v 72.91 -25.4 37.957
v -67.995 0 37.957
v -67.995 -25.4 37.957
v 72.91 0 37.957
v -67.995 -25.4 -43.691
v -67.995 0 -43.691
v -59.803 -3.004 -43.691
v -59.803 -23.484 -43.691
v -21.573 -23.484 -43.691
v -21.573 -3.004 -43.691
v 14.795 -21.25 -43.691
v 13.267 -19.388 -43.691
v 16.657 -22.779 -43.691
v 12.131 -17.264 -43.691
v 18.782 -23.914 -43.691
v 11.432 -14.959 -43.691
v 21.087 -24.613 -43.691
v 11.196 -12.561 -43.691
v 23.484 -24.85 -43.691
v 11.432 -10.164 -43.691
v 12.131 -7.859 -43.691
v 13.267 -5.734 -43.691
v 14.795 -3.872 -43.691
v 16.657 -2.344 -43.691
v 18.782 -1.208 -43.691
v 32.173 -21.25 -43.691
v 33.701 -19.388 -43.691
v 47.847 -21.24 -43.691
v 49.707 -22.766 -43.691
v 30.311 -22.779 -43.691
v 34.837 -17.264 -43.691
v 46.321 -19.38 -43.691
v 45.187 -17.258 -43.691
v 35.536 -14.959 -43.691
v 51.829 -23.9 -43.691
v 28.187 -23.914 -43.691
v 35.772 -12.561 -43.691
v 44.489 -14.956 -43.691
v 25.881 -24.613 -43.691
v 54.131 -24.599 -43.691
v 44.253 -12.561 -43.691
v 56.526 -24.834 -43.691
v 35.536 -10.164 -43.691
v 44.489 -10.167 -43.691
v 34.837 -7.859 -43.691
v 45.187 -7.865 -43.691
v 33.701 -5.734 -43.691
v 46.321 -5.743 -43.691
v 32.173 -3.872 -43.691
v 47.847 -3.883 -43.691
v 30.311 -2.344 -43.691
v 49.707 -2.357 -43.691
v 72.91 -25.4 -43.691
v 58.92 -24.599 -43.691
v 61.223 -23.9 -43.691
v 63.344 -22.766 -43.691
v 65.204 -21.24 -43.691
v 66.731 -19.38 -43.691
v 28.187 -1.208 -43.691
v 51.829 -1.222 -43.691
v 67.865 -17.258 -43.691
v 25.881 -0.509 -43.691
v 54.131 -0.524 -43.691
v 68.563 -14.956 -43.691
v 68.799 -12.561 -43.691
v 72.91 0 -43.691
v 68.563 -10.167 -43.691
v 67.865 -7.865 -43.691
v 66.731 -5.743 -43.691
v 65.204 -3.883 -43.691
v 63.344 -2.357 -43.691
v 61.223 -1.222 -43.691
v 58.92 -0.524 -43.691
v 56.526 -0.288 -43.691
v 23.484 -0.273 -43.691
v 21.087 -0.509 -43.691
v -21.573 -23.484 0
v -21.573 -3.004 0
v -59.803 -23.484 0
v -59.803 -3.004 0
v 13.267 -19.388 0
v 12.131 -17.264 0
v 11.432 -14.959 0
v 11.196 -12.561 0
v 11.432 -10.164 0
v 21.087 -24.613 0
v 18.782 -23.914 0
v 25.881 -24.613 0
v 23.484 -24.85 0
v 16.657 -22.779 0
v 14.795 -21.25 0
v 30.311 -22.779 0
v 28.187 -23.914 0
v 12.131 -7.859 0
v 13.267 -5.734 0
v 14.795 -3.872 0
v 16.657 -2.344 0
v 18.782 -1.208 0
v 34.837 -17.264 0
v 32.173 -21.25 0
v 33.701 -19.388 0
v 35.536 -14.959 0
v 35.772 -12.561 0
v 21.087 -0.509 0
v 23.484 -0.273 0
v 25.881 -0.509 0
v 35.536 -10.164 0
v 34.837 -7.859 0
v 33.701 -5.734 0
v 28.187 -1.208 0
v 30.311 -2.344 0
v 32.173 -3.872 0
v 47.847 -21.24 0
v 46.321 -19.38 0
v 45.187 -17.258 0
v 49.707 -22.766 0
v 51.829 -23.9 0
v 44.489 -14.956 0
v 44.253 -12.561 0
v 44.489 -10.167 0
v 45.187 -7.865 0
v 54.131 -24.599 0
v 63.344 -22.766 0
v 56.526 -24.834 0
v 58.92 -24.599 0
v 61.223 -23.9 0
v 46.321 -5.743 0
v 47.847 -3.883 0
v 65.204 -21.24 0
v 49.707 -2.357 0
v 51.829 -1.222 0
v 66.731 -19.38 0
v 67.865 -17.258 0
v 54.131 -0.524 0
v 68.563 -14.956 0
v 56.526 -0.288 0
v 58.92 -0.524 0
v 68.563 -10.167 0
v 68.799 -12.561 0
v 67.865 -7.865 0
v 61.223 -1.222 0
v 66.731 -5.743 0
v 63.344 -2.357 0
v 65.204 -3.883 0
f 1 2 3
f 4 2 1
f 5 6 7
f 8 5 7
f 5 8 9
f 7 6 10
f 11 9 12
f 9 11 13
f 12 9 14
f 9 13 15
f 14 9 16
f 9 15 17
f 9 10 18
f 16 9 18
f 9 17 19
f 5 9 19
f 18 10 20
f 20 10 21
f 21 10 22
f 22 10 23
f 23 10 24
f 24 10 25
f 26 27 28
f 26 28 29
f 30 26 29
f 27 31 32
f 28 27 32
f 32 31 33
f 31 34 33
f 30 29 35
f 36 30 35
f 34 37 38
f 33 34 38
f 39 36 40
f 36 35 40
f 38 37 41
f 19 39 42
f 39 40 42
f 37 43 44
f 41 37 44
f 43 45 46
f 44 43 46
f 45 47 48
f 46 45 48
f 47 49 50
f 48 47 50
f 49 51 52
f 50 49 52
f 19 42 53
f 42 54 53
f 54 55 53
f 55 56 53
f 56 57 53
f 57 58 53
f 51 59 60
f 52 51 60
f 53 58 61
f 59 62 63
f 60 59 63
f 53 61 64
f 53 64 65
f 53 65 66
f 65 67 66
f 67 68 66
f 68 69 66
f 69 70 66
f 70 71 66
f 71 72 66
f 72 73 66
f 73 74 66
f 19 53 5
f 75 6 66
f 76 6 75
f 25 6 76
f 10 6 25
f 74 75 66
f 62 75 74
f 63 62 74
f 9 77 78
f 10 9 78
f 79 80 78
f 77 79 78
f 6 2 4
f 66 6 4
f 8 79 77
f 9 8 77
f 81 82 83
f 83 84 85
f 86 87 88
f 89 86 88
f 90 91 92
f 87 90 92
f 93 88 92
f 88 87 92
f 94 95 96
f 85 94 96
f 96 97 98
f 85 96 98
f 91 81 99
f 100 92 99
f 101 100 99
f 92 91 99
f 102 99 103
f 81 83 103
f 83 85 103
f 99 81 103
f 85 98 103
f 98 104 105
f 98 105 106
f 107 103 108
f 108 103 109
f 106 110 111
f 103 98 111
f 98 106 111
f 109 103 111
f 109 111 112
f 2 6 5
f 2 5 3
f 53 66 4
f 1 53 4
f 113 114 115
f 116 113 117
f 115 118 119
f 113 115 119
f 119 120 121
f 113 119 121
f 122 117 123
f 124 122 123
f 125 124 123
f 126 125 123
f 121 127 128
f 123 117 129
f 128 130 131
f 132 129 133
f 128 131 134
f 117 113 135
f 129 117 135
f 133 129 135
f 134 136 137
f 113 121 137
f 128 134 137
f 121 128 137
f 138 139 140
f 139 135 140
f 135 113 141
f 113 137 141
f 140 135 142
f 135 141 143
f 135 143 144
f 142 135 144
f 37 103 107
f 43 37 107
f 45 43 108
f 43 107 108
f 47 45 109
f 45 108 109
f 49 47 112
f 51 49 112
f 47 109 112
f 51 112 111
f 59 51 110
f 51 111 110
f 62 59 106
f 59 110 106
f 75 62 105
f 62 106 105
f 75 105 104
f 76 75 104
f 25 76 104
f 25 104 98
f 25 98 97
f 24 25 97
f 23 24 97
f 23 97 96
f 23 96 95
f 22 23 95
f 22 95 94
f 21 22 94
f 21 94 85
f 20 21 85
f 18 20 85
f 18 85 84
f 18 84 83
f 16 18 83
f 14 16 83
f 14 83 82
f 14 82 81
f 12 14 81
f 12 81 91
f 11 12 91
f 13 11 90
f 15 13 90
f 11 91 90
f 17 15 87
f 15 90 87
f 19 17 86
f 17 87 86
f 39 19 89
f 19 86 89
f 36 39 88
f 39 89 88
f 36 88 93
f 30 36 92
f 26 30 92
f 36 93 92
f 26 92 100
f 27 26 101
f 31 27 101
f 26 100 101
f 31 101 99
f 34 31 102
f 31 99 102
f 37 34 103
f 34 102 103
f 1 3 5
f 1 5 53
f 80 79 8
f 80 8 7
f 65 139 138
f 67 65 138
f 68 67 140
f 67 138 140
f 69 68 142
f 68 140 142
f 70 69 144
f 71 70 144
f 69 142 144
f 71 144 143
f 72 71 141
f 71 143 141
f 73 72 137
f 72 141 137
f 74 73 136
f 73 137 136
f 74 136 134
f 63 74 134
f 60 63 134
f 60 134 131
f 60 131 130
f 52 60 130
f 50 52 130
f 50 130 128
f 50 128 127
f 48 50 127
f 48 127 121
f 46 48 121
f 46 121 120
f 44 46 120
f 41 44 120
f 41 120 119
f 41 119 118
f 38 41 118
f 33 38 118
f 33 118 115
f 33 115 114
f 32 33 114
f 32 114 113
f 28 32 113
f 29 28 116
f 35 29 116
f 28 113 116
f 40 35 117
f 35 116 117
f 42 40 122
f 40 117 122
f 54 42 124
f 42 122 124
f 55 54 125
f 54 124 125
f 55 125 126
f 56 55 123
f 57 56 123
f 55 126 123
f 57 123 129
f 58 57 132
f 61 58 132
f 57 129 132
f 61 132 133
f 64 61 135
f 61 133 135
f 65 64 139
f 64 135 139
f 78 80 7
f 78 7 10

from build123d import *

# Parameters (mm, degrees)
F0_W     = 140.904985
F0_H     = 81.648435
F1_DEPTH = 25.4
F2_R     = 12.273047
F2_R_2   = 12.288223
F2_W     = 38.230037
F2_H     = 20.480374
F3_DEPTH = 43.692471


with BuildPart() as f1:
    # F0 (on Front) → F1 (new body)
    with BuildSketch(Plane.XZ):
        with Locations((2.457645, -2.867254)):
            Rectangle(F0_W, F0_H)
    extrude(amount=F1_DEPTH)

    # F2 (on Top) → F3 (cut, through all)
    with BuildSketch(Plane.XY):
        with Locations((56.525838, -12.561298)):
            Circle(F2_R)
        with Locations((23.484165, -12.561298)):
            Circle(F2_R_2)
        with Locations((-40.687681, -13.243976)):
            Rectangle(F2_W, F2_H)
    extrude(amount=-F3_DEPTH, mode=Mode.SUBTRACT)


solid = f1.part
